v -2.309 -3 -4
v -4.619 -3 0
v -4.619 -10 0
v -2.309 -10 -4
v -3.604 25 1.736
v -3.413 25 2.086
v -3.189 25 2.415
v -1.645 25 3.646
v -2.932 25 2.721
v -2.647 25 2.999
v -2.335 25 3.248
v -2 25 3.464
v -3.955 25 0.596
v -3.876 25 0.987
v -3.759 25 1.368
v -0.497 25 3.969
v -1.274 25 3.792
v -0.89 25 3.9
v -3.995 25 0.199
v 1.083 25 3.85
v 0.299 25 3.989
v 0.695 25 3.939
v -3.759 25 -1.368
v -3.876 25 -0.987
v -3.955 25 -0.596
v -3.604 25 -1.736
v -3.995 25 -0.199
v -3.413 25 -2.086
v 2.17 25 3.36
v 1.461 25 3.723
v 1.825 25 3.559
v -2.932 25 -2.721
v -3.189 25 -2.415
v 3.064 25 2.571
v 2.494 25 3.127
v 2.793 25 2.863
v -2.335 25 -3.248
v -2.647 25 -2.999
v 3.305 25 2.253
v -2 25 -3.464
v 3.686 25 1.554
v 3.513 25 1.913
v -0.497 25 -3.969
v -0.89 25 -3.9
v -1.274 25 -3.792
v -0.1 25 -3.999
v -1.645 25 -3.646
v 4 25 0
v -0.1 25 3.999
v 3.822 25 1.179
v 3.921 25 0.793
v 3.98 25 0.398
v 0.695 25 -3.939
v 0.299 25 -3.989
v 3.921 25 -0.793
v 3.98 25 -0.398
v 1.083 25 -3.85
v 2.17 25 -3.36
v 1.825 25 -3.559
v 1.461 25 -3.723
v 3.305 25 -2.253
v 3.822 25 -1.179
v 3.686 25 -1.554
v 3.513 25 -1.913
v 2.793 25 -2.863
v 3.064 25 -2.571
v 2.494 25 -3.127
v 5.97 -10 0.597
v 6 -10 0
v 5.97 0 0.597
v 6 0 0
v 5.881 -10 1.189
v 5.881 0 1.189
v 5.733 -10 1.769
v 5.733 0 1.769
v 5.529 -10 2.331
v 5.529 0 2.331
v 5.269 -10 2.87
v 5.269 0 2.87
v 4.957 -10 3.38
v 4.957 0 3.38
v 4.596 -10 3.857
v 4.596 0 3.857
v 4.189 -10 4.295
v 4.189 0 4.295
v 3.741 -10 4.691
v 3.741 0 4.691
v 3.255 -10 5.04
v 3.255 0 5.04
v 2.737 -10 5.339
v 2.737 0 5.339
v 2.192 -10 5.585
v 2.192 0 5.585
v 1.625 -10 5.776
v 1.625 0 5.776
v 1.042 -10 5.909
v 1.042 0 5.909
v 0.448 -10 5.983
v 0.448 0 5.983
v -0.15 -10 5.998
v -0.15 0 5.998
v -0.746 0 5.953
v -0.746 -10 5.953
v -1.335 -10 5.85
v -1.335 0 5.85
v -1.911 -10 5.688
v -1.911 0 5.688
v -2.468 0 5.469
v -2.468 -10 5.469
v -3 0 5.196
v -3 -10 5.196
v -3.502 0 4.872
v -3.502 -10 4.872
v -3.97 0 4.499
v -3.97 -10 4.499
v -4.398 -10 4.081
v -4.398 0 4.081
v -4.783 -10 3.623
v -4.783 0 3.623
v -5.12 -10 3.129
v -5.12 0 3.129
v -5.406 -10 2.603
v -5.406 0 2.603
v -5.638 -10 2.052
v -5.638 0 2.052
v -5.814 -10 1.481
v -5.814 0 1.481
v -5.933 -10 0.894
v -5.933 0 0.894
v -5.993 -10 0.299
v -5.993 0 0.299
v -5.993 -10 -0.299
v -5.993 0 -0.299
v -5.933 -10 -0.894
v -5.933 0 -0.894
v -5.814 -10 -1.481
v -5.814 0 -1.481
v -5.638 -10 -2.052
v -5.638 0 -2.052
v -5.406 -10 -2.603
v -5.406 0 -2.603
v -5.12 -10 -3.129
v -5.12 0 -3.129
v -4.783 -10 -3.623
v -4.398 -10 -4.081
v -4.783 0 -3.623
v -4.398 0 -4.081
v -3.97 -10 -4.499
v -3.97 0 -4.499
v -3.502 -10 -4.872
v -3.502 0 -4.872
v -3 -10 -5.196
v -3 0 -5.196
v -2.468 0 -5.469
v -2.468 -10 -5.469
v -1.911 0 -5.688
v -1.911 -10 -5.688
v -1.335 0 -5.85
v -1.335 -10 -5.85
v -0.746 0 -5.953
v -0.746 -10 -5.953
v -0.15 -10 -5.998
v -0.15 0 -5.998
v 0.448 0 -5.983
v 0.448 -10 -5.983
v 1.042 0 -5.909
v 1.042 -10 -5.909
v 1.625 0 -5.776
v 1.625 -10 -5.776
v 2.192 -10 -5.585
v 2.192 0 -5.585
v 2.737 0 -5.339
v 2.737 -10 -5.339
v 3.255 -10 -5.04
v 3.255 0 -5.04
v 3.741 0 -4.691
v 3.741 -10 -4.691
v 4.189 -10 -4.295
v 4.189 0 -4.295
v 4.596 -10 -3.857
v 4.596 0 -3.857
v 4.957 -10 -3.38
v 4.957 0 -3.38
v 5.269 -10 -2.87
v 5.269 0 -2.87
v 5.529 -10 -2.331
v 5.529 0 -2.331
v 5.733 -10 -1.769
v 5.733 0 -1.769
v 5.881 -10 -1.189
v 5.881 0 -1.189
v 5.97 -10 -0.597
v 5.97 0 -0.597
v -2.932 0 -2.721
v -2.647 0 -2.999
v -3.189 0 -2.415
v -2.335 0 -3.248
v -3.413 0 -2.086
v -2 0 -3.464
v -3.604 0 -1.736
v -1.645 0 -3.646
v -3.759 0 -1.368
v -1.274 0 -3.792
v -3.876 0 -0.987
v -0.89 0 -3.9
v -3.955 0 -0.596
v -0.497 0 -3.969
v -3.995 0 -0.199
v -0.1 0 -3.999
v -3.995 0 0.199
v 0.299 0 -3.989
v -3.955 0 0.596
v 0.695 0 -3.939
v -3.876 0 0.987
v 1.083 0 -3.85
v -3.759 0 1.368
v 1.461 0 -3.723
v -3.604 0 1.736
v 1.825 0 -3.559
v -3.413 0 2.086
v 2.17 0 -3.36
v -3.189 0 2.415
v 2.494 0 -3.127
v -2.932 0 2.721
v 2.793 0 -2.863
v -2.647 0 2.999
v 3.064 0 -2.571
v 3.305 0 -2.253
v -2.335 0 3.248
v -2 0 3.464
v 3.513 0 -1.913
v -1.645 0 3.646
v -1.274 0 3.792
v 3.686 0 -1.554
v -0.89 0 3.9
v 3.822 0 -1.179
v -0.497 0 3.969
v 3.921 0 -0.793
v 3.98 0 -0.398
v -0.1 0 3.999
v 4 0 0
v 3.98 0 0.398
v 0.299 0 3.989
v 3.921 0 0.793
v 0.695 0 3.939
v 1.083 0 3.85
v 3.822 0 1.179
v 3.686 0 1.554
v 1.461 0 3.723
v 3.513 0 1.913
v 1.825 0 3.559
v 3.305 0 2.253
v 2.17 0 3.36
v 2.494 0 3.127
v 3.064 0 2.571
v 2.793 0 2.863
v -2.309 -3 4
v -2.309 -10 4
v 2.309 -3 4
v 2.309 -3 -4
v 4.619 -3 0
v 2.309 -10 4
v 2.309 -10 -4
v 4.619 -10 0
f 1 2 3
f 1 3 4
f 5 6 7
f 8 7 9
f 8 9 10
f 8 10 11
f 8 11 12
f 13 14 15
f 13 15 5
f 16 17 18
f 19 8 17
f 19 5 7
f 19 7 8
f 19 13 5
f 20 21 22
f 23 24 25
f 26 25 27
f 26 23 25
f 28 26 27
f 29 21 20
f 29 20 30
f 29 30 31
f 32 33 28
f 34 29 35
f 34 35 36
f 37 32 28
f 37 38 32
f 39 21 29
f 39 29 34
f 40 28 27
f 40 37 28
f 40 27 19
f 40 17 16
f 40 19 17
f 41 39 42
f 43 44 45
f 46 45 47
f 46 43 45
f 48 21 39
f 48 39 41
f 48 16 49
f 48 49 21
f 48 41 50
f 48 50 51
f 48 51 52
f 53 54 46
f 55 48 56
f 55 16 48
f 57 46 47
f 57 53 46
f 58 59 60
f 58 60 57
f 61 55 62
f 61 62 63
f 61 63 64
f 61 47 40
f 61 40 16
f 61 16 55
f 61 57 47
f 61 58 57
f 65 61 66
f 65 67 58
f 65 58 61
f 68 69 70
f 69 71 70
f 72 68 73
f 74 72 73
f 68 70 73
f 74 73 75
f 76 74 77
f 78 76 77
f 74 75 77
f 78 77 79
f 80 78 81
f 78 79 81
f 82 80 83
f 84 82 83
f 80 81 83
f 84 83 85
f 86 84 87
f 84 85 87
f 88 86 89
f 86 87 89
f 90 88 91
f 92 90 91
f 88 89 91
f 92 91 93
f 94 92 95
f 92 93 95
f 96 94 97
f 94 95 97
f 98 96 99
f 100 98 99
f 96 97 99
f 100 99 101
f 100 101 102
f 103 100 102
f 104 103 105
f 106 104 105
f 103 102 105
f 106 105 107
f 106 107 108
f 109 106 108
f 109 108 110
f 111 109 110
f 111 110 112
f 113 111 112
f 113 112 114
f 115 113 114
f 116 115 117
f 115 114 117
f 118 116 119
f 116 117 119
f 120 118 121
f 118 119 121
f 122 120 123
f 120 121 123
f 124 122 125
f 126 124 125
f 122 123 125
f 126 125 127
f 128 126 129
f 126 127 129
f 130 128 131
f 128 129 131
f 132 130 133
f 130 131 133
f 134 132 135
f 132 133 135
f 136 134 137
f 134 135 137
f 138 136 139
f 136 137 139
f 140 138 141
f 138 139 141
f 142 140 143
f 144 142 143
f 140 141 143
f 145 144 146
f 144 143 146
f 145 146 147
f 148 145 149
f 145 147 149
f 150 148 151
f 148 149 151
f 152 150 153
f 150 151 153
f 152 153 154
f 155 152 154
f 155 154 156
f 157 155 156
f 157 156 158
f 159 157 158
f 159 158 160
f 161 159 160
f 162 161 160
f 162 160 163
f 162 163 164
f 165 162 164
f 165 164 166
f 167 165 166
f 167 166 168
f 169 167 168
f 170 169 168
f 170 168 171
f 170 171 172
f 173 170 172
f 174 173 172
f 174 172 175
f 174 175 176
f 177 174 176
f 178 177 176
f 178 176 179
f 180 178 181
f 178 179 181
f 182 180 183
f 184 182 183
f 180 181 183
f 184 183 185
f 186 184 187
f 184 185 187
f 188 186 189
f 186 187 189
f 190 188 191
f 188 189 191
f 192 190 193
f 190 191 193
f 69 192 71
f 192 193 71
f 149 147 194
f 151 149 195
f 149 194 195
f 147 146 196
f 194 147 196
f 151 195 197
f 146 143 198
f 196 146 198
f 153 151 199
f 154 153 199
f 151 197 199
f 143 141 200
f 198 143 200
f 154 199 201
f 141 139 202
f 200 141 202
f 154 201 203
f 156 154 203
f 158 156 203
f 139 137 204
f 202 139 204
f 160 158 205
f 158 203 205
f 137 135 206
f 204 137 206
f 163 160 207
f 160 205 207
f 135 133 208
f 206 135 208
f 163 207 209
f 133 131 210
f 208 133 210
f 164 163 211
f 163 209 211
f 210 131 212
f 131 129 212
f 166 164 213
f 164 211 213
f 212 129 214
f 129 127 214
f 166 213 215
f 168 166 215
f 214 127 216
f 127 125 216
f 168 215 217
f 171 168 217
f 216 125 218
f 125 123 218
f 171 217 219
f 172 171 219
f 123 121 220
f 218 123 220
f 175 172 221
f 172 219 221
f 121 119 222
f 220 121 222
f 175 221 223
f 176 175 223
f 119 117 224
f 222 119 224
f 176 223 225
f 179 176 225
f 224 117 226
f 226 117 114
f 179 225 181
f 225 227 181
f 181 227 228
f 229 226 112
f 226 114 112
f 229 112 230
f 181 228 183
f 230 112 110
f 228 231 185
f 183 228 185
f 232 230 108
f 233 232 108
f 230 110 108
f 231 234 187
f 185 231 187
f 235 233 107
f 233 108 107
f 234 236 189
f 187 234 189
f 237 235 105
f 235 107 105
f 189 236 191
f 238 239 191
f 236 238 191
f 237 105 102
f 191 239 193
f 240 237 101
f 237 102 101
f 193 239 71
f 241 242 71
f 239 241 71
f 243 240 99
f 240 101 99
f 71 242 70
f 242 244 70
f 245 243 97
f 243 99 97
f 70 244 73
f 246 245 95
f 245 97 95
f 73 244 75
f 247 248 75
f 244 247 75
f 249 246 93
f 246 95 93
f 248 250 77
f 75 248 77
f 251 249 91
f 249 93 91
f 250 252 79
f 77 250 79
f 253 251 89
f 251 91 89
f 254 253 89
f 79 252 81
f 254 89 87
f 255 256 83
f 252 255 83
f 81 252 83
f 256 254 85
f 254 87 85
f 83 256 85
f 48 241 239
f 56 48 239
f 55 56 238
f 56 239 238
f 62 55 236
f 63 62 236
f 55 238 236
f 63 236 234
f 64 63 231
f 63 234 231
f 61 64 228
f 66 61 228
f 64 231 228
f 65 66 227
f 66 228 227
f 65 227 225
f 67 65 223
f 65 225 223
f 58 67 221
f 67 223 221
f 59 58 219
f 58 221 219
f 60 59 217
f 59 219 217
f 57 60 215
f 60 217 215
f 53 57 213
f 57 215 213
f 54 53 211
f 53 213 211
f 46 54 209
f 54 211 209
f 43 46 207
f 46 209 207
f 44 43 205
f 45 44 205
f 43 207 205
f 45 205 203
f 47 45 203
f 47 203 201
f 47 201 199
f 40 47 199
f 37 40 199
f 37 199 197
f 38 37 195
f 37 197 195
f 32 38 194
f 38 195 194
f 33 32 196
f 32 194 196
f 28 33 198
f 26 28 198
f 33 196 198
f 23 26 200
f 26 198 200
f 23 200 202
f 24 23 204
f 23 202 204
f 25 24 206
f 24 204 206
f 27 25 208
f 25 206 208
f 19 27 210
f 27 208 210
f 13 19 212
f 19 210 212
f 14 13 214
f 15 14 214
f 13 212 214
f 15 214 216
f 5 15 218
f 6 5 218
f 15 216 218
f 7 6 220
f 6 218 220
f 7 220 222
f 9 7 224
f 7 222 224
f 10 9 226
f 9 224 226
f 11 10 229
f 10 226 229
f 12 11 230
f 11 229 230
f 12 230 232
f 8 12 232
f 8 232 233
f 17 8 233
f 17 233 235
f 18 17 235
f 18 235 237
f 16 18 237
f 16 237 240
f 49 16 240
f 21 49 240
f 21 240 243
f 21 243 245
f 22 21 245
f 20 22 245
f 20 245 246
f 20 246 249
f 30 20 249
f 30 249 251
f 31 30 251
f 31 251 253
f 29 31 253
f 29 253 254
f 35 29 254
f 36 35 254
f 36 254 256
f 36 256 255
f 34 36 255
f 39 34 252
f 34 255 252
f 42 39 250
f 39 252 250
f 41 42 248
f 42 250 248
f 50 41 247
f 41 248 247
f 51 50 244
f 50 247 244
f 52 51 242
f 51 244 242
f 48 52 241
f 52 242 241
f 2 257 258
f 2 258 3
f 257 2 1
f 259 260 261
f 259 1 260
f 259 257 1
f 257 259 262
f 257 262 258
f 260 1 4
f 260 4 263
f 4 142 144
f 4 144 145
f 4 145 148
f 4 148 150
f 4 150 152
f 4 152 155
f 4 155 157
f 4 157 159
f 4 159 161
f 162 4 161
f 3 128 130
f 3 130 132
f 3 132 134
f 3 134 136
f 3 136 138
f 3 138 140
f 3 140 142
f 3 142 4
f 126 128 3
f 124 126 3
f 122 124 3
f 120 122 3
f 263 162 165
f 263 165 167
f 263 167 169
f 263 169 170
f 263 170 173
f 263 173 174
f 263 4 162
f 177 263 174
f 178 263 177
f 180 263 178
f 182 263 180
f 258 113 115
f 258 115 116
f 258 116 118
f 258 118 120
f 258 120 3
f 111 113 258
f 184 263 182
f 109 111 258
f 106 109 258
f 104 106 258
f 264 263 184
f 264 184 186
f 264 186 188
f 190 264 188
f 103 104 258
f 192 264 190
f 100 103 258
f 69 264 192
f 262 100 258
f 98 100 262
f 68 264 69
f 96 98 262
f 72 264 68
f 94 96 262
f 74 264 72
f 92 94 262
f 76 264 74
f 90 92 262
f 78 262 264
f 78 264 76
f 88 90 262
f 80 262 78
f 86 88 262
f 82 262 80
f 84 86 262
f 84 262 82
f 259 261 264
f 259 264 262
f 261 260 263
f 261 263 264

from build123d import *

# Parameters (mm, degrees)
SKETCH1_R           = 4
BOSS_EXTRUDE1_DEPTH = 25
SKETCH2_R           = 6
SKETCH2_R_2         = 4
BOSS_EXTRUDE2_DEPTH = 3
SKETCH3_R           = 6
BOSS_EXTRUDE3_DEPTH = 7


with BuildPart() as part:
    # Sketch1 → Boss-Extrude1 (new body)
    with BuildSketch(Plane(origin=(0, 0, 0), x_dir=(1, 0, 0), z_dir=(0, 1, 0))):
        Circle(SKETCH1_R)
    extrude(amount=BOSS_EXTRUDE1_DEPTH)

    # Sketch2 → Boss-Extrude2 (add)
    with BuildSketch(Plane.XZ):
        Circle(SKETCH2_R)
        Circle(SKETCH2_R_2, mode=Mode.SUBTRACT)
        Circle(SKETCH2_R_2)
        Circle(SKETCH2_R_2)
    extrude(amount=BOSS_EXTRUDE2_DEPTH)

    # Sketch3 → Boss-Extrude3 (add)
    with BuildSketch(Plane.XZ.offset(3)):
        Circle(SKETCH3_R)
        Polygon((4.618802154, 0), (2.309401077, 4), (-2.309401077, 4), (-4.618802154, 0), (-2.309401077, -4), (2.309401077, -4), align=None, mode=Mode.SUBTRACT)
    extrude(amount=BOSS_EXTRUDE3_DEPTH)


solid = part.part
